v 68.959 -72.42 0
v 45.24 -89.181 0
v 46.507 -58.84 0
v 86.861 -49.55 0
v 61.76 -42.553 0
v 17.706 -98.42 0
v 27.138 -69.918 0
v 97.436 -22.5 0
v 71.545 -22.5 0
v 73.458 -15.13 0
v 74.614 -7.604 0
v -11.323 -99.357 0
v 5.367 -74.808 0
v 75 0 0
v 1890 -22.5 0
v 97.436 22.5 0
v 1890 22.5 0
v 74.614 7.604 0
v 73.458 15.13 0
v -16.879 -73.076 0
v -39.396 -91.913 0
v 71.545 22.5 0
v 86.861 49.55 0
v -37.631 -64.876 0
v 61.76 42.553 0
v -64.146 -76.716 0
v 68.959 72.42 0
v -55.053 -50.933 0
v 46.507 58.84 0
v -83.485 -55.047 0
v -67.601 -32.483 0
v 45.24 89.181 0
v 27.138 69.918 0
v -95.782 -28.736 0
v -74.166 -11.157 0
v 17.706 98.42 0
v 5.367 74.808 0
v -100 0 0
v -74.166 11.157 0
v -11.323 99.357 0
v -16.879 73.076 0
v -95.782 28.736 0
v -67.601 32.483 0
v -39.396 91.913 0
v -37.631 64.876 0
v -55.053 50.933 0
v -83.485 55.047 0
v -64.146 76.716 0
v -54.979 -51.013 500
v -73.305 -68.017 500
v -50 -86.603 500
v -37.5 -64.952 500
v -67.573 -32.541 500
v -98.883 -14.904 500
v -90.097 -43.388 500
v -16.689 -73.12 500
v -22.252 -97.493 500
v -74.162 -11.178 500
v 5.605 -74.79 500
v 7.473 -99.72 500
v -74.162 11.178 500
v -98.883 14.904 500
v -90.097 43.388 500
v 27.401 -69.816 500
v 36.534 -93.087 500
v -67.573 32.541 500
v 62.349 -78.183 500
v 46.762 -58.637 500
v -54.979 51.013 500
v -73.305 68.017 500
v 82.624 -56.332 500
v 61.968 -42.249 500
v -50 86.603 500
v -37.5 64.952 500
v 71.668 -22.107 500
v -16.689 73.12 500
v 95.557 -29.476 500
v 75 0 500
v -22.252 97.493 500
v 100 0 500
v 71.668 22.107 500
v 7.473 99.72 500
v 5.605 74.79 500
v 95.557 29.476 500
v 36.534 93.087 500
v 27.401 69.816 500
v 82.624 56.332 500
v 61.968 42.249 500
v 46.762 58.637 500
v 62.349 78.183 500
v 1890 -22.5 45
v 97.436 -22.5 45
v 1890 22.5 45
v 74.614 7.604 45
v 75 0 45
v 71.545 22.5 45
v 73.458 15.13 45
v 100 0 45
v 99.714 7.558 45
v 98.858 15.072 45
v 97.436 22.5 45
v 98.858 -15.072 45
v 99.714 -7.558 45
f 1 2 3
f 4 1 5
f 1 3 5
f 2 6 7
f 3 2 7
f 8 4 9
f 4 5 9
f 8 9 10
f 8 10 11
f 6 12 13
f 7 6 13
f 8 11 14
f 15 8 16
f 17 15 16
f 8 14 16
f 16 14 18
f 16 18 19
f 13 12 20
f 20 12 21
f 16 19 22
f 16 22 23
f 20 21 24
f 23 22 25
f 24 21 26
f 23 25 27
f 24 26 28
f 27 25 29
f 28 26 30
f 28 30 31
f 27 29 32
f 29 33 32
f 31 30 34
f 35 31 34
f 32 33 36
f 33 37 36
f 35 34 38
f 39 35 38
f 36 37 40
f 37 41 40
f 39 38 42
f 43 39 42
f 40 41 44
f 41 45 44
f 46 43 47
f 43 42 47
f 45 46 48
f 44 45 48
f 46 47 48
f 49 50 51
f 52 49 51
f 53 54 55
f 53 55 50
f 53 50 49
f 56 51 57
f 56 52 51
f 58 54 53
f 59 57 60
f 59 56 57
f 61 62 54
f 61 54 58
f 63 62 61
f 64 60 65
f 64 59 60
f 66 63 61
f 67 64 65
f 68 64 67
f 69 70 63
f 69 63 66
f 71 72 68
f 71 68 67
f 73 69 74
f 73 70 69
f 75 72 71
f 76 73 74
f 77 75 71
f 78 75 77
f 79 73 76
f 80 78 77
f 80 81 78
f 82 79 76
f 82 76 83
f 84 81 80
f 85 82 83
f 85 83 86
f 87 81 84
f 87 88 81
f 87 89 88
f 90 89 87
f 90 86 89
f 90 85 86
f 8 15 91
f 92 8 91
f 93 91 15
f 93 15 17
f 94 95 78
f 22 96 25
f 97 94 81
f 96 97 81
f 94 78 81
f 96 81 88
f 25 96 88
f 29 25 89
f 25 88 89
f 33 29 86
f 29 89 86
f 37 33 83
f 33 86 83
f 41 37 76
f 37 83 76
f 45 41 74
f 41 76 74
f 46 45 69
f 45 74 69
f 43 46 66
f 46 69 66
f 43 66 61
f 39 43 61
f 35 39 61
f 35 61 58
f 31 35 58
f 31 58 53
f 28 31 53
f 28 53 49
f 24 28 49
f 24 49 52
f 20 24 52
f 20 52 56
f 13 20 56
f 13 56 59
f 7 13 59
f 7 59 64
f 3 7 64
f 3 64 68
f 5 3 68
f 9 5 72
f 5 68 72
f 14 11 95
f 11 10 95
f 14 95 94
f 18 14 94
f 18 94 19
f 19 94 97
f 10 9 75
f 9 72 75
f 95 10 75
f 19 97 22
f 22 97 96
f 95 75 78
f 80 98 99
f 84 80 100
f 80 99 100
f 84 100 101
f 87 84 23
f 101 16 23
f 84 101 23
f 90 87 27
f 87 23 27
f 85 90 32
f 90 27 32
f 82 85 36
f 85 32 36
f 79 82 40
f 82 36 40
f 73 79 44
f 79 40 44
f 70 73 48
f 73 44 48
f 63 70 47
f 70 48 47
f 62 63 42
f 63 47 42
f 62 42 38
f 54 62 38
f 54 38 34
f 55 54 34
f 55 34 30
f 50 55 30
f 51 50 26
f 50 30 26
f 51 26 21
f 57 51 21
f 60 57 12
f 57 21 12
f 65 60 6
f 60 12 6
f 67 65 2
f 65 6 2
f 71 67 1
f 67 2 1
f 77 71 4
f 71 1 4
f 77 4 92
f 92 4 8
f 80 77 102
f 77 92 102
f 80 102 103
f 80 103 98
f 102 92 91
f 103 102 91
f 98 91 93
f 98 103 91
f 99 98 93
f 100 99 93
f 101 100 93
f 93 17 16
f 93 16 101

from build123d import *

# Parameters (mm, degrees)
F0_R     = 100
F1_DEPTH = 500
F2_R     = 75
F3_DEPTH = 500.001
F4_W     = 45
F4_H     = 45
F5_DEPTH = 1890
F7_DEPTH = 500.001


with BuildPart() as f1:
    # F0 (on Top) → F1 (new body)
    with BuildSketch(Plane.XY):
        Circle(F0_R)
    extrude(amount=F1_DEPTH)

    # F2 (on face) → F3 (cut, through all)
    with BuildSketch(Plane.XY.offset(500)):
        Circle(F2_R)
    extrude(amount=-F3_DEPTH, mode=Mode.SUBTRACT)

    # F4 (on Right) → F5 (join)
    with BuildSketch(Plane.YZ):
        with Locations((0, 22.5)):
            Rectangle(F4_W, F4_H)
    extrude(amount=F5_DEPTH)

    # F6 (on face) → F7 (cut, through all)
    with BuildSketch(Plane(origin=(0, 0, 0), x_dir=(1, 0, 0), z_dir=(0, 0, -1))):
        with BuildLine():
            ThreePointArc((71.5454401063, -22.5), (74.1313294362, -11.3818274462), (75, 0))
            ThreePointArc((75, 0), (74.1313294362, 11.3818274462), (71.5454401063, 22.5))
            Line((71.5454401063, 22.5), (0, 22.5))
            Line((0, 22.5), (0, -22.5))
            Line((0, -22.5), (71.5454401063, -22.5))
        make_face()
    extrude(amount=-F7_DEPTH, mode=Mode.SUBTRACT)


solid = f1.part
